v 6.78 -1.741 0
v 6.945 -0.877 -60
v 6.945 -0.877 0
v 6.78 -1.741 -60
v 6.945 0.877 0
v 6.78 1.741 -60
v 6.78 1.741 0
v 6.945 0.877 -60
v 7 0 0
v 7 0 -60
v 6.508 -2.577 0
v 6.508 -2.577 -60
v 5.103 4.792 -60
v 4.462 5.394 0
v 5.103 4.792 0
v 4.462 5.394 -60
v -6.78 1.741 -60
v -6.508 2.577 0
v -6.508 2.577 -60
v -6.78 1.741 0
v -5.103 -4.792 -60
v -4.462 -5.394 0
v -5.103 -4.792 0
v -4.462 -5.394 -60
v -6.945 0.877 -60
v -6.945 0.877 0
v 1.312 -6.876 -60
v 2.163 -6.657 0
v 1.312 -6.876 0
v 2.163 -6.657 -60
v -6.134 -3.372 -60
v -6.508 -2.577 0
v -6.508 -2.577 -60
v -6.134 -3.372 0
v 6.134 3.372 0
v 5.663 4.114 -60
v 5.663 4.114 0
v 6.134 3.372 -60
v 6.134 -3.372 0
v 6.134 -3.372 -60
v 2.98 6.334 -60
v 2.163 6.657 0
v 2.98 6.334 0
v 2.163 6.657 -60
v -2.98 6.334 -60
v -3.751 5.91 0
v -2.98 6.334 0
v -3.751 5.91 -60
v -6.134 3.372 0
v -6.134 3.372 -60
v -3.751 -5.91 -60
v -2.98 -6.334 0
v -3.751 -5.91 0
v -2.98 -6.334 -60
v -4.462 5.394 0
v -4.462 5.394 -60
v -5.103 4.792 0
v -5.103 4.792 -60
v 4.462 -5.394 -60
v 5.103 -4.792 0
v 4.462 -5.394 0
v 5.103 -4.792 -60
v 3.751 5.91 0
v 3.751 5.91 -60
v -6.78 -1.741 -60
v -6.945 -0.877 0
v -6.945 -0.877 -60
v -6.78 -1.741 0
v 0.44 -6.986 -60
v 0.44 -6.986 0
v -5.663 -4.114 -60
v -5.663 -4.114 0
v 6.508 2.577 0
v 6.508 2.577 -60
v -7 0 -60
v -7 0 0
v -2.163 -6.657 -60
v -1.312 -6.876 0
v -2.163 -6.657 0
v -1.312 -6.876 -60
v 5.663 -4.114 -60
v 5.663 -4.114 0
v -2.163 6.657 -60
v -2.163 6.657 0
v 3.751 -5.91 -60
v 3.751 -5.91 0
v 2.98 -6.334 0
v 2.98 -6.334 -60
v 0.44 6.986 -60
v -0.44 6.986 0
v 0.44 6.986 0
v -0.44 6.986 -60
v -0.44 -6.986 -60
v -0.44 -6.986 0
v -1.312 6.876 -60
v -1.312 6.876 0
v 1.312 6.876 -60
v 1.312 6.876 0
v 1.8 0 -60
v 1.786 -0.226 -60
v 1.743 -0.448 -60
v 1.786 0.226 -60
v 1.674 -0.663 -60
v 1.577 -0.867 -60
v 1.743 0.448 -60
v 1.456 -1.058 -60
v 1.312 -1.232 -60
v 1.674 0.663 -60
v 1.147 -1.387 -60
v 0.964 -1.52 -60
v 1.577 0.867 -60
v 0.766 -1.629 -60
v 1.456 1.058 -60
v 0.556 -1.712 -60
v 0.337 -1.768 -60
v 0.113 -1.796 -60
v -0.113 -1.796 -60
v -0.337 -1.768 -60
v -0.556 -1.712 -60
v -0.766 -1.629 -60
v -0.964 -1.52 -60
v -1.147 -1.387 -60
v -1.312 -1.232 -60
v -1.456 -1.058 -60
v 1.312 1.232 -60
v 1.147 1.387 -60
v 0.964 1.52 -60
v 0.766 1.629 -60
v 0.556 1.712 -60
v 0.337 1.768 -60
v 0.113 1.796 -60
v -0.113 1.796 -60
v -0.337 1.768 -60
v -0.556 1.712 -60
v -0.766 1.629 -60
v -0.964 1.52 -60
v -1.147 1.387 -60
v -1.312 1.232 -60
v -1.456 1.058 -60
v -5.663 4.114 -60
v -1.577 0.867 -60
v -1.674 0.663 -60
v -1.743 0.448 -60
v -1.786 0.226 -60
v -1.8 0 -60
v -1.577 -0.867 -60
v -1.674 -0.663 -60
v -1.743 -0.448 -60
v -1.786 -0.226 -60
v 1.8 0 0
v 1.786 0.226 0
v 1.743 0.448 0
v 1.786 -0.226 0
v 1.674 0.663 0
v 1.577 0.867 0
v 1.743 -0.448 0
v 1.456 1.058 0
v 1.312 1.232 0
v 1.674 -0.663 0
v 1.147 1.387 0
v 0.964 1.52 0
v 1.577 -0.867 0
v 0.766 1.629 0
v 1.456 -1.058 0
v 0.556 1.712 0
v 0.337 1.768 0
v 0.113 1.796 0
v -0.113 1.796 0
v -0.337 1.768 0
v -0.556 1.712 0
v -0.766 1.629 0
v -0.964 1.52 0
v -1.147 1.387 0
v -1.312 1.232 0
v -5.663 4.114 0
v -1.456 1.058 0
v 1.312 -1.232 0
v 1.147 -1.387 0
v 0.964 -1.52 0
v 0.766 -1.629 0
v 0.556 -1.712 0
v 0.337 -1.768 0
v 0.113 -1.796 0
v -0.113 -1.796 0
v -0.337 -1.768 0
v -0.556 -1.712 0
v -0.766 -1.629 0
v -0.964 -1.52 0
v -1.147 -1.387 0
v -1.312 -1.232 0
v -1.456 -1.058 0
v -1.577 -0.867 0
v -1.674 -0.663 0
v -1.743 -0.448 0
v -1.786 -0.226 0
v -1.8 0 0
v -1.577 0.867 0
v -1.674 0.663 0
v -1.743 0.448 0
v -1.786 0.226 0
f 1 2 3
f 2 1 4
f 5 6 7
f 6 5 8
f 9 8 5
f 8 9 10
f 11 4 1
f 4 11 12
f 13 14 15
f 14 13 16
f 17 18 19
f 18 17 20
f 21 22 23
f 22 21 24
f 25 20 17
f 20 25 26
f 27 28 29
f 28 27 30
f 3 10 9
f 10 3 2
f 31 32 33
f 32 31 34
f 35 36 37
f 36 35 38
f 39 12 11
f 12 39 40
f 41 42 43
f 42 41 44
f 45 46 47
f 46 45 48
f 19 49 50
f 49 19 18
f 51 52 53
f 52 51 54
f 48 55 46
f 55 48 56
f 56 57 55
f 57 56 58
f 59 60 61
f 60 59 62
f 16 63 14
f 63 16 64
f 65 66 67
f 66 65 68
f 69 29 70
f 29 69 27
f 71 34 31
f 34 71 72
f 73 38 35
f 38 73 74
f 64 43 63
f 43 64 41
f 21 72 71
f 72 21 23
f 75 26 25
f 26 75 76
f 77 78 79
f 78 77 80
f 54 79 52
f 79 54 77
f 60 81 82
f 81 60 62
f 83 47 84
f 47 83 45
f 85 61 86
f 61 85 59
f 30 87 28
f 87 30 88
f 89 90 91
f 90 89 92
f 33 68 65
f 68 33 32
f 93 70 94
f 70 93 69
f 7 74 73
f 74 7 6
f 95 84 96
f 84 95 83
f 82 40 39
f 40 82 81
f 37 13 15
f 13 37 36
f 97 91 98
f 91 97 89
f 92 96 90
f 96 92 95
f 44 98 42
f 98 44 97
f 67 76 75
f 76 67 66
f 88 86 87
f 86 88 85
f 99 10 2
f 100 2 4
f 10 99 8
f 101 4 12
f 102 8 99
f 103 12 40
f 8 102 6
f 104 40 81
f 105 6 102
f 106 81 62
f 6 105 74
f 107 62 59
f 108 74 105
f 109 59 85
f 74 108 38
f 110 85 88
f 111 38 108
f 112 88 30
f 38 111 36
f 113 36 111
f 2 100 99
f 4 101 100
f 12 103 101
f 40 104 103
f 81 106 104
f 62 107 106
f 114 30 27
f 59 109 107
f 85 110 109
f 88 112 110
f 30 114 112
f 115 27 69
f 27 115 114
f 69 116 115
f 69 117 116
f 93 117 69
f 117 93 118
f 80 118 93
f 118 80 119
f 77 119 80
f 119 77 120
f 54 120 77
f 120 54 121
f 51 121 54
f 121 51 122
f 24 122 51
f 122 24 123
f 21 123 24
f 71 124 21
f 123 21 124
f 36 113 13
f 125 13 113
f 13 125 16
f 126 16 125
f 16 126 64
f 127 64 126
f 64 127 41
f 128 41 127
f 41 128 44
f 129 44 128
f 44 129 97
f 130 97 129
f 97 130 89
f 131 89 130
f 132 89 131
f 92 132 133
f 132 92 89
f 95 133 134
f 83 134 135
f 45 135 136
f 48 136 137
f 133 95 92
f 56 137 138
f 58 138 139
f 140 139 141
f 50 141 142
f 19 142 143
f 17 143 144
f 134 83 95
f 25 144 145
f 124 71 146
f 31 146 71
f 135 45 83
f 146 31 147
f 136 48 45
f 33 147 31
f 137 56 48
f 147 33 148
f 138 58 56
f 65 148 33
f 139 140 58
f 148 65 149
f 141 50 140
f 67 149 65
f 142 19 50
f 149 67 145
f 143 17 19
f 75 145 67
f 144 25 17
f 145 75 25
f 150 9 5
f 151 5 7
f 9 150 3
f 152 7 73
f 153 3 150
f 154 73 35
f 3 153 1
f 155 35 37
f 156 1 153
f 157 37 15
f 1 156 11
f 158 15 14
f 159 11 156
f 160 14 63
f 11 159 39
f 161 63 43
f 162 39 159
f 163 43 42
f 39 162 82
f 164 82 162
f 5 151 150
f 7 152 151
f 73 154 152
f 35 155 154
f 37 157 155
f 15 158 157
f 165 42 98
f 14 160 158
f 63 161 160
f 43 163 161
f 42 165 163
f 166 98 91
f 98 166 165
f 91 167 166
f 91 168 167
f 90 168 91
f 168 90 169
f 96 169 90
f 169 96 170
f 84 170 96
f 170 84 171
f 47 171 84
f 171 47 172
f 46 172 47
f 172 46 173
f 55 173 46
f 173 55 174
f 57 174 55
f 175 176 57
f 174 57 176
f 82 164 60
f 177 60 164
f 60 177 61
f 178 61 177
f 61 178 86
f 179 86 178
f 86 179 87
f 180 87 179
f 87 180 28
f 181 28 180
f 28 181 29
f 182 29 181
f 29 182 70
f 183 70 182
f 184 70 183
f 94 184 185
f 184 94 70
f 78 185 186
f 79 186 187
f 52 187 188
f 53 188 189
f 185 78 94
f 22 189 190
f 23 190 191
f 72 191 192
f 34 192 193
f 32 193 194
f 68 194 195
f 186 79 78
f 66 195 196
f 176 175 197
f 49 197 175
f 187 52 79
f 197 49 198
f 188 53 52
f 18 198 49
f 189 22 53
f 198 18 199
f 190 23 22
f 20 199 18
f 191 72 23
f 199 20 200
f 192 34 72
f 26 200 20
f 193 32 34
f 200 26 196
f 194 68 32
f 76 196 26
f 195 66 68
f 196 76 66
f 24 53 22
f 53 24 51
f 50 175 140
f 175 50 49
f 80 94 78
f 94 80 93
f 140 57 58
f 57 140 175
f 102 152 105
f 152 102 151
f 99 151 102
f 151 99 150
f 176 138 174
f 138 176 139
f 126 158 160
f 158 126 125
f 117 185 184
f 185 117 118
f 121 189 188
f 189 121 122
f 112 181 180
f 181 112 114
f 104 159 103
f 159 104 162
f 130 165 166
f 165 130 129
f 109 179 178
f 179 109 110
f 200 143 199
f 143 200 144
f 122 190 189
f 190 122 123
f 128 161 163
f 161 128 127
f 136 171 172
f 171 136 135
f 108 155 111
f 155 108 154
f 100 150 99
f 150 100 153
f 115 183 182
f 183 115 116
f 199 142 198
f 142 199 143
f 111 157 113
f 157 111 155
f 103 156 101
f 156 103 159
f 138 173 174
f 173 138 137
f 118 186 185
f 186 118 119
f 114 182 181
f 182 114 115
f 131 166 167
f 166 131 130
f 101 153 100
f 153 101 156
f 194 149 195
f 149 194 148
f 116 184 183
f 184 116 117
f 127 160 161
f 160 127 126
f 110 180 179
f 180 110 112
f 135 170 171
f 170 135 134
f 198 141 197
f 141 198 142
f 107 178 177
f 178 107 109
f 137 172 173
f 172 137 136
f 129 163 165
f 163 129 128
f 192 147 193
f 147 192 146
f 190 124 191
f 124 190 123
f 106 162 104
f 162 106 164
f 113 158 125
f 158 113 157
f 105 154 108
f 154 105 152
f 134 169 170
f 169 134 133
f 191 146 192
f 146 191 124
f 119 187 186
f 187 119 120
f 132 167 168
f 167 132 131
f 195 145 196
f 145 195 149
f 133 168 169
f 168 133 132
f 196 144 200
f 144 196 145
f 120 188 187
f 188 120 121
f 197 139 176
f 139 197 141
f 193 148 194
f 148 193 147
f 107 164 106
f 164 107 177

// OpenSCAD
$fn = 50;


difference() {
	union() {
		translate(v = [0, 0, -60.0000000000]) {
			cylinder(h = 60, r = 7.0000000000);
		}
		cylinder(h = 0, r = 13.0000000000);
	}
	union() {
		#translate(v = [0, 0, -60]) {
			cylinder(h = 60, r = 1.8000000000);
		}
	}
}
